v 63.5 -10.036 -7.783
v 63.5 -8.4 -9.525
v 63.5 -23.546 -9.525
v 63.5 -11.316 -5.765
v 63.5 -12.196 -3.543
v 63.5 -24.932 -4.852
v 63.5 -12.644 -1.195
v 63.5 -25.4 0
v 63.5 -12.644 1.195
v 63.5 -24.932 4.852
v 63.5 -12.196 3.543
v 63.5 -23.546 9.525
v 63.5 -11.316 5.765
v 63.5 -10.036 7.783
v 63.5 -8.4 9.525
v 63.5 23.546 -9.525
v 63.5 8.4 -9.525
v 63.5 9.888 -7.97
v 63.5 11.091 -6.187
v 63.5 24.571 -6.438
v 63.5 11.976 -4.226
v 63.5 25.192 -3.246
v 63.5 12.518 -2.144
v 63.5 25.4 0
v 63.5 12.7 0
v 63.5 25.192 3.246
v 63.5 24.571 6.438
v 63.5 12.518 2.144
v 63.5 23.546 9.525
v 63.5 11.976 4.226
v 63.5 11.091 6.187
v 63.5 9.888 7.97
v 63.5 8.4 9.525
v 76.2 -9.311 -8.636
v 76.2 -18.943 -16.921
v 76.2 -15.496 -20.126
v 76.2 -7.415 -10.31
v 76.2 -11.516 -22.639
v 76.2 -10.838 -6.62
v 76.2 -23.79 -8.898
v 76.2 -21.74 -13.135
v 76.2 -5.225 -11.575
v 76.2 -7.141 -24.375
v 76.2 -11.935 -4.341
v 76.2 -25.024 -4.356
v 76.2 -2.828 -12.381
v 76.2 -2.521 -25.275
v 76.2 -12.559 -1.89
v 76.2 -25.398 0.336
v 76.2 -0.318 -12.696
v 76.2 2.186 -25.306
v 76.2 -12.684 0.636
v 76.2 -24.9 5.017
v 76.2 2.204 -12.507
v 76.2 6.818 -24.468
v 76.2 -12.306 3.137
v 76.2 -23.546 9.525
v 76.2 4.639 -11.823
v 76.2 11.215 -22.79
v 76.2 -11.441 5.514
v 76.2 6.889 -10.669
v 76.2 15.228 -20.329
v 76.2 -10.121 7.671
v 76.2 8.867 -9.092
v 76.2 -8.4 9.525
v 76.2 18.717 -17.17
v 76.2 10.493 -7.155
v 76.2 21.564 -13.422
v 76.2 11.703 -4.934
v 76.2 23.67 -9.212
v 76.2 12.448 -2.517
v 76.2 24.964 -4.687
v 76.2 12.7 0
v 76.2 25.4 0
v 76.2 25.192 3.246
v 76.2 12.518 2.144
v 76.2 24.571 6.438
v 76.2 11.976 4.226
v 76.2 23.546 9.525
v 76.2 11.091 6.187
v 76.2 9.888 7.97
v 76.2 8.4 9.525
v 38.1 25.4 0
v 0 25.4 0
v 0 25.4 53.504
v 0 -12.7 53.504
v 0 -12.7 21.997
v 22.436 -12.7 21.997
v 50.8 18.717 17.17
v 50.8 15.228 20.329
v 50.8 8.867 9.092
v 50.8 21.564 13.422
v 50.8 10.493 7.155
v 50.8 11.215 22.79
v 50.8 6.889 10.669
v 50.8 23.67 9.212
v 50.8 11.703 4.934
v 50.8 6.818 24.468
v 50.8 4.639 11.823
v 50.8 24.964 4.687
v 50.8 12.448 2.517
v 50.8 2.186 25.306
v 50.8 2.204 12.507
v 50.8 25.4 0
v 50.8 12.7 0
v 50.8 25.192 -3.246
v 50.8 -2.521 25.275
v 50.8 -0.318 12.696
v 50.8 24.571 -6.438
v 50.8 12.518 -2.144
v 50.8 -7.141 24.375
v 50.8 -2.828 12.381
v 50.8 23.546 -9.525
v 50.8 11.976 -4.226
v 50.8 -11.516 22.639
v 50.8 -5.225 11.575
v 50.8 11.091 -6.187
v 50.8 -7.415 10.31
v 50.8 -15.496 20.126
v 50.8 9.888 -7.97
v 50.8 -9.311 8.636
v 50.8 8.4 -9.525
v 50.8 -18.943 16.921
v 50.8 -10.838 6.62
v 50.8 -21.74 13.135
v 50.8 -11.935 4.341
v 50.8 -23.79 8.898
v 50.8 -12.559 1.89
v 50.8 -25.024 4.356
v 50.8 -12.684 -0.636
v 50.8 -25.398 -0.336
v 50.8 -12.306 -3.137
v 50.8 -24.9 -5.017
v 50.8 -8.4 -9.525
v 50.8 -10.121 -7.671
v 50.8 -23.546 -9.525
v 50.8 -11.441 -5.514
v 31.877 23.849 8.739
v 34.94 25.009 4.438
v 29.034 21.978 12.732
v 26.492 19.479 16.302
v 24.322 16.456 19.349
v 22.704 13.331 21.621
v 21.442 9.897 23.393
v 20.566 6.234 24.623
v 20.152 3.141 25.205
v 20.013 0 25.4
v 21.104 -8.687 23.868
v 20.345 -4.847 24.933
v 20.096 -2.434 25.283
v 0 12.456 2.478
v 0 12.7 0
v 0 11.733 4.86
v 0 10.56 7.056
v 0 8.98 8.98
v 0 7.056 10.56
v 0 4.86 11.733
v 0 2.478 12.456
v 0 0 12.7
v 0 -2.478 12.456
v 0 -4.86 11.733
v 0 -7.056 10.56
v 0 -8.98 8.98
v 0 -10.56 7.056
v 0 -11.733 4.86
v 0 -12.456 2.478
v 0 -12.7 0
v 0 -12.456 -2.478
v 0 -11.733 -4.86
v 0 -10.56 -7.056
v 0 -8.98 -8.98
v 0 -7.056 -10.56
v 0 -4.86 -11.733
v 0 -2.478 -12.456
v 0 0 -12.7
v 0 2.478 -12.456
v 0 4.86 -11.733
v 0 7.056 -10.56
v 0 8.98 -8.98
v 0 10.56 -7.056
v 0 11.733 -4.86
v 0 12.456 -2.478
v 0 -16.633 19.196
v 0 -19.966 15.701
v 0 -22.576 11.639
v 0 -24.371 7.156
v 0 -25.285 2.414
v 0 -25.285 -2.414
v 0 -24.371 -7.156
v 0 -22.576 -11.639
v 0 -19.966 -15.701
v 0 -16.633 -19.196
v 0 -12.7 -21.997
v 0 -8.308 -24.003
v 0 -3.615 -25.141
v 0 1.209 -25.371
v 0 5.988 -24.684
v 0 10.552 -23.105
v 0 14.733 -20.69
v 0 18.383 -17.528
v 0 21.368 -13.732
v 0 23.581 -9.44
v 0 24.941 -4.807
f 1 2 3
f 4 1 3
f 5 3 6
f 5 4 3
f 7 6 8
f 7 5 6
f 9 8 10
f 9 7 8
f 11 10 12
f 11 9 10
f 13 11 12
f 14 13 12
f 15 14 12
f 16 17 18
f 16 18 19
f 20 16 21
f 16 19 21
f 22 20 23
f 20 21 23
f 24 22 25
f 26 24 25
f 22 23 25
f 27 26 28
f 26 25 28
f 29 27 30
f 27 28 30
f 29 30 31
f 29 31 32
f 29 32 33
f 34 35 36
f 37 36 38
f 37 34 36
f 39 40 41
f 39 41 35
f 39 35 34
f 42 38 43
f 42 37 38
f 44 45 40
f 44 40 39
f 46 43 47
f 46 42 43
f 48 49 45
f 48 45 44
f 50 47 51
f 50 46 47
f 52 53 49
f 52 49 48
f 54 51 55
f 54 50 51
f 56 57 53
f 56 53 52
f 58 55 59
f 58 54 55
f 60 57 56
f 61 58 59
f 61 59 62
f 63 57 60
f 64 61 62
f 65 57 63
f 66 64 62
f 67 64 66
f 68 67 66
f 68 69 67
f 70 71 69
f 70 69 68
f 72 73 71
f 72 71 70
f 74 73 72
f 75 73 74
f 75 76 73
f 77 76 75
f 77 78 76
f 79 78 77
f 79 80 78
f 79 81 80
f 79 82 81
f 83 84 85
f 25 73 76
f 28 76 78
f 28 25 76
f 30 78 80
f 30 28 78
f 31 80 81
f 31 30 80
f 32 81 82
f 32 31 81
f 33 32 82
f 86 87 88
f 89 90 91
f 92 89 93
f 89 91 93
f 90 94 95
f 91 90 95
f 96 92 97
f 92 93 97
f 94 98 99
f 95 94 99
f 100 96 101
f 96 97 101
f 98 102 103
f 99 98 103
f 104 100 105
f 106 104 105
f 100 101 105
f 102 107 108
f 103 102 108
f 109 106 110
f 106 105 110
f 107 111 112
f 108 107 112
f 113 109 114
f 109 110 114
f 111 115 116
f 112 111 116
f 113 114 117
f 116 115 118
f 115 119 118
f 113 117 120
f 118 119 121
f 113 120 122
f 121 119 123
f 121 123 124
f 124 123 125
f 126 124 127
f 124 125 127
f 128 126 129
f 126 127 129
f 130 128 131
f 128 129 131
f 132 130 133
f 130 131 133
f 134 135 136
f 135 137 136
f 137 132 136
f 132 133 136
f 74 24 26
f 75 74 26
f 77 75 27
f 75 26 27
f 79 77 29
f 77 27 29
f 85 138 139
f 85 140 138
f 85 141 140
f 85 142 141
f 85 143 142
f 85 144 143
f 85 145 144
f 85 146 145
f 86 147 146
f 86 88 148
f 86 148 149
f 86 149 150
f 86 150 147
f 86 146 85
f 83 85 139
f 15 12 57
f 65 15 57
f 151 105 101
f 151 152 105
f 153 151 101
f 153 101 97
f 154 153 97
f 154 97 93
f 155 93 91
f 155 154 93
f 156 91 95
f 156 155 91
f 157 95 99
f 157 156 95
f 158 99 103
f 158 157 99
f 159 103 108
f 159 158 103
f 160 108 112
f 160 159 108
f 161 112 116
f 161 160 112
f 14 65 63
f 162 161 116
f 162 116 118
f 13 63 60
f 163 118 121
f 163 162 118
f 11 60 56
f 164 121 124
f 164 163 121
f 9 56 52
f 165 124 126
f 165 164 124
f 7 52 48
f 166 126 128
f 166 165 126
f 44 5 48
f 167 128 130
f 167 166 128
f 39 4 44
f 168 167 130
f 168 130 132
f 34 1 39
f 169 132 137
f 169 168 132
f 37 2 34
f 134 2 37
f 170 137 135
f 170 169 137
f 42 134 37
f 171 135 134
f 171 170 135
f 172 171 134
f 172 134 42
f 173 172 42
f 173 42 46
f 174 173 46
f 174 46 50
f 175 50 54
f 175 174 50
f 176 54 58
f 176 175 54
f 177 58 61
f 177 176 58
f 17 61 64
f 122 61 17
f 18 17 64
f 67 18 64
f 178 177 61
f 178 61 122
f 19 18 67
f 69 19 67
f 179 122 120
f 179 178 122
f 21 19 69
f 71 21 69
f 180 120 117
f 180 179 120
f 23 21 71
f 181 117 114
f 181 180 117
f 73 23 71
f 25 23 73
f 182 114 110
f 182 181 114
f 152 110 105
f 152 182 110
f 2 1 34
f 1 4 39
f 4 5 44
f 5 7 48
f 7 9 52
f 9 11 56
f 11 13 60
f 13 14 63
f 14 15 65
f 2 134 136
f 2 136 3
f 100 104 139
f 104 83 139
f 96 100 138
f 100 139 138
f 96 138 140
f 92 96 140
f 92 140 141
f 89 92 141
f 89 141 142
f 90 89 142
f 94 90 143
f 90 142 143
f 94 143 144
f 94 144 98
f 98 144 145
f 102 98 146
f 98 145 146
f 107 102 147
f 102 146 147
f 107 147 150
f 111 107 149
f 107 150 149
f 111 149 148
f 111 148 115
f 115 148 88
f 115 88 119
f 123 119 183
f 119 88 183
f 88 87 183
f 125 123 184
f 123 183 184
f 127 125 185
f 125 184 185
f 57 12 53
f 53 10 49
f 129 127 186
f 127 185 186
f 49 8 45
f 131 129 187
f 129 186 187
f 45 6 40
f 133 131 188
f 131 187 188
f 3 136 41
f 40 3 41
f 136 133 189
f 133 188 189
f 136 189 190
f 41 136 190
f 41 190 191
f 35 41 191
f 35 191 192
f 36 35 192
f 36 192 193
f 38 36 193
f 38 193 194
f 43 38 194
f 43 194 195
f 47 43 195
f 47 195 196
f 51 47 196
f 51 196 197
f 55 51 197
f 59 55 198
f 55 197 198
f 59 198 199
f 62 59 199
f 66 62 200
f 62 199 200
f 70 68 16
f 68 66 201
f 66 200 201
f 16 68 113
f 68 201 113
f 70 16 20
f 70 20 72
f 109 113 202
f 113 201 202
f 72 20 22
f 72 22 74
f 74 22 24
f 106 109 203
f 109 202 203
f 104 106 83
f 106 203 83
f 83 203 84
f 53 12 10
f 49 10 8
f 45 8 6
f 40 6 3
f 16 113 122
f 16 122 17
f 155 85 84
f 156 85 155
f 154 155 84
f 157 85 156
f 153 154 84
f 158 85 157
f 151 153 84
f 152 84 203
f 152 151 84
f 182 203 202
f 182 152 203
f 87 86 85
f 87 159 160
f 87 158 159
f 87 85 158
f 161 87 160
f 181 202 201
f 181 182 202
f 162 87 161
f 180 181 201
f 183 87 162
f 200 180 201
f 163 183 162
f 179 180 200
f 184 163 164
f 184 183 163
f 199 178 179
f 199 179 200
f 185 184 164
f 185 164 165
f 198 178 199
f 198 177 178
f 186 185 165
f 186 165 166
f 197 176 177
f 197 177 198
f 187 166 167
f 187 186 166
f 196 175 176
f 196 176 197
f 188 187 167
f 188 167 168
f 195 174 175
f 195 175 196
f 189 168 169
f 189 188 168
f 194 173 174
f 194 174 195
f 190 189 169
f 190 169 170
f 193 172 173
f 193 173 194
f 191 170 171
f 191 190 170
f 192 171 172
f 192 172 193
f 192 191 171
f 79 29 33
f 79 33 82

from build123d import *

# Parameters (mm, degrees)
F0_R          = 12.7
F1_DEPTH      = 76.2
F3_DEPTH      = 25.401
F3_DEPTH_BACK = 25.4
F5_DEPTH      = 25.4
F6_DEPTH      = 12.7
F7_DEPTH      = 50.8


with BuildPart() as f1:
    # F0 (on Right) → F1 (new body)
    with BuildSketch(Plane.YZ):
        with BuildLine():
            ThreePointArc((-19.5864308625, 16.171942557), (-8.5925740058, -23.9024616296), (25.4, 0))
            ThreePointArc((25.4, 0), (8.5925740058, 23.9024616296), (-19.5864308625, 16.171942557))
        make_face()
        Circle(F0_R, mode=Mode.SUBTRACT)
    extrude(amount=F1_DEPTH)

    # F2 (on Front) → F3 (cut, two sides)
    with BuildSketch(Plane.XZ) as f3_sk:
        Polygon((76.2, 9.525), (76.2, 25.4), (50.8, 25.4), (50.8, -9.525), (63.5, -9.525), (63.5, 9.525), align=None)
    extrude(amount=-F3_DEPTH, mode=Mode.SUBTRACT)
    extrude(f3_sk.sketch, amount=F3_DEPTH_BACK, mode=Mode.SUBTRACT)

    # F4 (on Front) → F5 (join)
    with BuildSketch(Plane.XZ):
        Polygon((38.1, 0), (0, 53.5043813288), (0, 0), align=None)
    extrude(amount=-F5_DEPTH)

    # F4 (on Front) → F6 (join)
    with BuildSketch(Plane.XZ):
        Polygon((38.1, 0), (0, 53.5043813288), (0, 0), align=None)
    extrude(amount=F6_DEPTH)

    # F0 (on Right) → F7 (cut)
    with BuildSketch(Plane.YZ):
        Circle(F0_R)
    extrude(amount=F7_DEPTH, mode=Mode.SUBTRACT)


solid = f1.part
